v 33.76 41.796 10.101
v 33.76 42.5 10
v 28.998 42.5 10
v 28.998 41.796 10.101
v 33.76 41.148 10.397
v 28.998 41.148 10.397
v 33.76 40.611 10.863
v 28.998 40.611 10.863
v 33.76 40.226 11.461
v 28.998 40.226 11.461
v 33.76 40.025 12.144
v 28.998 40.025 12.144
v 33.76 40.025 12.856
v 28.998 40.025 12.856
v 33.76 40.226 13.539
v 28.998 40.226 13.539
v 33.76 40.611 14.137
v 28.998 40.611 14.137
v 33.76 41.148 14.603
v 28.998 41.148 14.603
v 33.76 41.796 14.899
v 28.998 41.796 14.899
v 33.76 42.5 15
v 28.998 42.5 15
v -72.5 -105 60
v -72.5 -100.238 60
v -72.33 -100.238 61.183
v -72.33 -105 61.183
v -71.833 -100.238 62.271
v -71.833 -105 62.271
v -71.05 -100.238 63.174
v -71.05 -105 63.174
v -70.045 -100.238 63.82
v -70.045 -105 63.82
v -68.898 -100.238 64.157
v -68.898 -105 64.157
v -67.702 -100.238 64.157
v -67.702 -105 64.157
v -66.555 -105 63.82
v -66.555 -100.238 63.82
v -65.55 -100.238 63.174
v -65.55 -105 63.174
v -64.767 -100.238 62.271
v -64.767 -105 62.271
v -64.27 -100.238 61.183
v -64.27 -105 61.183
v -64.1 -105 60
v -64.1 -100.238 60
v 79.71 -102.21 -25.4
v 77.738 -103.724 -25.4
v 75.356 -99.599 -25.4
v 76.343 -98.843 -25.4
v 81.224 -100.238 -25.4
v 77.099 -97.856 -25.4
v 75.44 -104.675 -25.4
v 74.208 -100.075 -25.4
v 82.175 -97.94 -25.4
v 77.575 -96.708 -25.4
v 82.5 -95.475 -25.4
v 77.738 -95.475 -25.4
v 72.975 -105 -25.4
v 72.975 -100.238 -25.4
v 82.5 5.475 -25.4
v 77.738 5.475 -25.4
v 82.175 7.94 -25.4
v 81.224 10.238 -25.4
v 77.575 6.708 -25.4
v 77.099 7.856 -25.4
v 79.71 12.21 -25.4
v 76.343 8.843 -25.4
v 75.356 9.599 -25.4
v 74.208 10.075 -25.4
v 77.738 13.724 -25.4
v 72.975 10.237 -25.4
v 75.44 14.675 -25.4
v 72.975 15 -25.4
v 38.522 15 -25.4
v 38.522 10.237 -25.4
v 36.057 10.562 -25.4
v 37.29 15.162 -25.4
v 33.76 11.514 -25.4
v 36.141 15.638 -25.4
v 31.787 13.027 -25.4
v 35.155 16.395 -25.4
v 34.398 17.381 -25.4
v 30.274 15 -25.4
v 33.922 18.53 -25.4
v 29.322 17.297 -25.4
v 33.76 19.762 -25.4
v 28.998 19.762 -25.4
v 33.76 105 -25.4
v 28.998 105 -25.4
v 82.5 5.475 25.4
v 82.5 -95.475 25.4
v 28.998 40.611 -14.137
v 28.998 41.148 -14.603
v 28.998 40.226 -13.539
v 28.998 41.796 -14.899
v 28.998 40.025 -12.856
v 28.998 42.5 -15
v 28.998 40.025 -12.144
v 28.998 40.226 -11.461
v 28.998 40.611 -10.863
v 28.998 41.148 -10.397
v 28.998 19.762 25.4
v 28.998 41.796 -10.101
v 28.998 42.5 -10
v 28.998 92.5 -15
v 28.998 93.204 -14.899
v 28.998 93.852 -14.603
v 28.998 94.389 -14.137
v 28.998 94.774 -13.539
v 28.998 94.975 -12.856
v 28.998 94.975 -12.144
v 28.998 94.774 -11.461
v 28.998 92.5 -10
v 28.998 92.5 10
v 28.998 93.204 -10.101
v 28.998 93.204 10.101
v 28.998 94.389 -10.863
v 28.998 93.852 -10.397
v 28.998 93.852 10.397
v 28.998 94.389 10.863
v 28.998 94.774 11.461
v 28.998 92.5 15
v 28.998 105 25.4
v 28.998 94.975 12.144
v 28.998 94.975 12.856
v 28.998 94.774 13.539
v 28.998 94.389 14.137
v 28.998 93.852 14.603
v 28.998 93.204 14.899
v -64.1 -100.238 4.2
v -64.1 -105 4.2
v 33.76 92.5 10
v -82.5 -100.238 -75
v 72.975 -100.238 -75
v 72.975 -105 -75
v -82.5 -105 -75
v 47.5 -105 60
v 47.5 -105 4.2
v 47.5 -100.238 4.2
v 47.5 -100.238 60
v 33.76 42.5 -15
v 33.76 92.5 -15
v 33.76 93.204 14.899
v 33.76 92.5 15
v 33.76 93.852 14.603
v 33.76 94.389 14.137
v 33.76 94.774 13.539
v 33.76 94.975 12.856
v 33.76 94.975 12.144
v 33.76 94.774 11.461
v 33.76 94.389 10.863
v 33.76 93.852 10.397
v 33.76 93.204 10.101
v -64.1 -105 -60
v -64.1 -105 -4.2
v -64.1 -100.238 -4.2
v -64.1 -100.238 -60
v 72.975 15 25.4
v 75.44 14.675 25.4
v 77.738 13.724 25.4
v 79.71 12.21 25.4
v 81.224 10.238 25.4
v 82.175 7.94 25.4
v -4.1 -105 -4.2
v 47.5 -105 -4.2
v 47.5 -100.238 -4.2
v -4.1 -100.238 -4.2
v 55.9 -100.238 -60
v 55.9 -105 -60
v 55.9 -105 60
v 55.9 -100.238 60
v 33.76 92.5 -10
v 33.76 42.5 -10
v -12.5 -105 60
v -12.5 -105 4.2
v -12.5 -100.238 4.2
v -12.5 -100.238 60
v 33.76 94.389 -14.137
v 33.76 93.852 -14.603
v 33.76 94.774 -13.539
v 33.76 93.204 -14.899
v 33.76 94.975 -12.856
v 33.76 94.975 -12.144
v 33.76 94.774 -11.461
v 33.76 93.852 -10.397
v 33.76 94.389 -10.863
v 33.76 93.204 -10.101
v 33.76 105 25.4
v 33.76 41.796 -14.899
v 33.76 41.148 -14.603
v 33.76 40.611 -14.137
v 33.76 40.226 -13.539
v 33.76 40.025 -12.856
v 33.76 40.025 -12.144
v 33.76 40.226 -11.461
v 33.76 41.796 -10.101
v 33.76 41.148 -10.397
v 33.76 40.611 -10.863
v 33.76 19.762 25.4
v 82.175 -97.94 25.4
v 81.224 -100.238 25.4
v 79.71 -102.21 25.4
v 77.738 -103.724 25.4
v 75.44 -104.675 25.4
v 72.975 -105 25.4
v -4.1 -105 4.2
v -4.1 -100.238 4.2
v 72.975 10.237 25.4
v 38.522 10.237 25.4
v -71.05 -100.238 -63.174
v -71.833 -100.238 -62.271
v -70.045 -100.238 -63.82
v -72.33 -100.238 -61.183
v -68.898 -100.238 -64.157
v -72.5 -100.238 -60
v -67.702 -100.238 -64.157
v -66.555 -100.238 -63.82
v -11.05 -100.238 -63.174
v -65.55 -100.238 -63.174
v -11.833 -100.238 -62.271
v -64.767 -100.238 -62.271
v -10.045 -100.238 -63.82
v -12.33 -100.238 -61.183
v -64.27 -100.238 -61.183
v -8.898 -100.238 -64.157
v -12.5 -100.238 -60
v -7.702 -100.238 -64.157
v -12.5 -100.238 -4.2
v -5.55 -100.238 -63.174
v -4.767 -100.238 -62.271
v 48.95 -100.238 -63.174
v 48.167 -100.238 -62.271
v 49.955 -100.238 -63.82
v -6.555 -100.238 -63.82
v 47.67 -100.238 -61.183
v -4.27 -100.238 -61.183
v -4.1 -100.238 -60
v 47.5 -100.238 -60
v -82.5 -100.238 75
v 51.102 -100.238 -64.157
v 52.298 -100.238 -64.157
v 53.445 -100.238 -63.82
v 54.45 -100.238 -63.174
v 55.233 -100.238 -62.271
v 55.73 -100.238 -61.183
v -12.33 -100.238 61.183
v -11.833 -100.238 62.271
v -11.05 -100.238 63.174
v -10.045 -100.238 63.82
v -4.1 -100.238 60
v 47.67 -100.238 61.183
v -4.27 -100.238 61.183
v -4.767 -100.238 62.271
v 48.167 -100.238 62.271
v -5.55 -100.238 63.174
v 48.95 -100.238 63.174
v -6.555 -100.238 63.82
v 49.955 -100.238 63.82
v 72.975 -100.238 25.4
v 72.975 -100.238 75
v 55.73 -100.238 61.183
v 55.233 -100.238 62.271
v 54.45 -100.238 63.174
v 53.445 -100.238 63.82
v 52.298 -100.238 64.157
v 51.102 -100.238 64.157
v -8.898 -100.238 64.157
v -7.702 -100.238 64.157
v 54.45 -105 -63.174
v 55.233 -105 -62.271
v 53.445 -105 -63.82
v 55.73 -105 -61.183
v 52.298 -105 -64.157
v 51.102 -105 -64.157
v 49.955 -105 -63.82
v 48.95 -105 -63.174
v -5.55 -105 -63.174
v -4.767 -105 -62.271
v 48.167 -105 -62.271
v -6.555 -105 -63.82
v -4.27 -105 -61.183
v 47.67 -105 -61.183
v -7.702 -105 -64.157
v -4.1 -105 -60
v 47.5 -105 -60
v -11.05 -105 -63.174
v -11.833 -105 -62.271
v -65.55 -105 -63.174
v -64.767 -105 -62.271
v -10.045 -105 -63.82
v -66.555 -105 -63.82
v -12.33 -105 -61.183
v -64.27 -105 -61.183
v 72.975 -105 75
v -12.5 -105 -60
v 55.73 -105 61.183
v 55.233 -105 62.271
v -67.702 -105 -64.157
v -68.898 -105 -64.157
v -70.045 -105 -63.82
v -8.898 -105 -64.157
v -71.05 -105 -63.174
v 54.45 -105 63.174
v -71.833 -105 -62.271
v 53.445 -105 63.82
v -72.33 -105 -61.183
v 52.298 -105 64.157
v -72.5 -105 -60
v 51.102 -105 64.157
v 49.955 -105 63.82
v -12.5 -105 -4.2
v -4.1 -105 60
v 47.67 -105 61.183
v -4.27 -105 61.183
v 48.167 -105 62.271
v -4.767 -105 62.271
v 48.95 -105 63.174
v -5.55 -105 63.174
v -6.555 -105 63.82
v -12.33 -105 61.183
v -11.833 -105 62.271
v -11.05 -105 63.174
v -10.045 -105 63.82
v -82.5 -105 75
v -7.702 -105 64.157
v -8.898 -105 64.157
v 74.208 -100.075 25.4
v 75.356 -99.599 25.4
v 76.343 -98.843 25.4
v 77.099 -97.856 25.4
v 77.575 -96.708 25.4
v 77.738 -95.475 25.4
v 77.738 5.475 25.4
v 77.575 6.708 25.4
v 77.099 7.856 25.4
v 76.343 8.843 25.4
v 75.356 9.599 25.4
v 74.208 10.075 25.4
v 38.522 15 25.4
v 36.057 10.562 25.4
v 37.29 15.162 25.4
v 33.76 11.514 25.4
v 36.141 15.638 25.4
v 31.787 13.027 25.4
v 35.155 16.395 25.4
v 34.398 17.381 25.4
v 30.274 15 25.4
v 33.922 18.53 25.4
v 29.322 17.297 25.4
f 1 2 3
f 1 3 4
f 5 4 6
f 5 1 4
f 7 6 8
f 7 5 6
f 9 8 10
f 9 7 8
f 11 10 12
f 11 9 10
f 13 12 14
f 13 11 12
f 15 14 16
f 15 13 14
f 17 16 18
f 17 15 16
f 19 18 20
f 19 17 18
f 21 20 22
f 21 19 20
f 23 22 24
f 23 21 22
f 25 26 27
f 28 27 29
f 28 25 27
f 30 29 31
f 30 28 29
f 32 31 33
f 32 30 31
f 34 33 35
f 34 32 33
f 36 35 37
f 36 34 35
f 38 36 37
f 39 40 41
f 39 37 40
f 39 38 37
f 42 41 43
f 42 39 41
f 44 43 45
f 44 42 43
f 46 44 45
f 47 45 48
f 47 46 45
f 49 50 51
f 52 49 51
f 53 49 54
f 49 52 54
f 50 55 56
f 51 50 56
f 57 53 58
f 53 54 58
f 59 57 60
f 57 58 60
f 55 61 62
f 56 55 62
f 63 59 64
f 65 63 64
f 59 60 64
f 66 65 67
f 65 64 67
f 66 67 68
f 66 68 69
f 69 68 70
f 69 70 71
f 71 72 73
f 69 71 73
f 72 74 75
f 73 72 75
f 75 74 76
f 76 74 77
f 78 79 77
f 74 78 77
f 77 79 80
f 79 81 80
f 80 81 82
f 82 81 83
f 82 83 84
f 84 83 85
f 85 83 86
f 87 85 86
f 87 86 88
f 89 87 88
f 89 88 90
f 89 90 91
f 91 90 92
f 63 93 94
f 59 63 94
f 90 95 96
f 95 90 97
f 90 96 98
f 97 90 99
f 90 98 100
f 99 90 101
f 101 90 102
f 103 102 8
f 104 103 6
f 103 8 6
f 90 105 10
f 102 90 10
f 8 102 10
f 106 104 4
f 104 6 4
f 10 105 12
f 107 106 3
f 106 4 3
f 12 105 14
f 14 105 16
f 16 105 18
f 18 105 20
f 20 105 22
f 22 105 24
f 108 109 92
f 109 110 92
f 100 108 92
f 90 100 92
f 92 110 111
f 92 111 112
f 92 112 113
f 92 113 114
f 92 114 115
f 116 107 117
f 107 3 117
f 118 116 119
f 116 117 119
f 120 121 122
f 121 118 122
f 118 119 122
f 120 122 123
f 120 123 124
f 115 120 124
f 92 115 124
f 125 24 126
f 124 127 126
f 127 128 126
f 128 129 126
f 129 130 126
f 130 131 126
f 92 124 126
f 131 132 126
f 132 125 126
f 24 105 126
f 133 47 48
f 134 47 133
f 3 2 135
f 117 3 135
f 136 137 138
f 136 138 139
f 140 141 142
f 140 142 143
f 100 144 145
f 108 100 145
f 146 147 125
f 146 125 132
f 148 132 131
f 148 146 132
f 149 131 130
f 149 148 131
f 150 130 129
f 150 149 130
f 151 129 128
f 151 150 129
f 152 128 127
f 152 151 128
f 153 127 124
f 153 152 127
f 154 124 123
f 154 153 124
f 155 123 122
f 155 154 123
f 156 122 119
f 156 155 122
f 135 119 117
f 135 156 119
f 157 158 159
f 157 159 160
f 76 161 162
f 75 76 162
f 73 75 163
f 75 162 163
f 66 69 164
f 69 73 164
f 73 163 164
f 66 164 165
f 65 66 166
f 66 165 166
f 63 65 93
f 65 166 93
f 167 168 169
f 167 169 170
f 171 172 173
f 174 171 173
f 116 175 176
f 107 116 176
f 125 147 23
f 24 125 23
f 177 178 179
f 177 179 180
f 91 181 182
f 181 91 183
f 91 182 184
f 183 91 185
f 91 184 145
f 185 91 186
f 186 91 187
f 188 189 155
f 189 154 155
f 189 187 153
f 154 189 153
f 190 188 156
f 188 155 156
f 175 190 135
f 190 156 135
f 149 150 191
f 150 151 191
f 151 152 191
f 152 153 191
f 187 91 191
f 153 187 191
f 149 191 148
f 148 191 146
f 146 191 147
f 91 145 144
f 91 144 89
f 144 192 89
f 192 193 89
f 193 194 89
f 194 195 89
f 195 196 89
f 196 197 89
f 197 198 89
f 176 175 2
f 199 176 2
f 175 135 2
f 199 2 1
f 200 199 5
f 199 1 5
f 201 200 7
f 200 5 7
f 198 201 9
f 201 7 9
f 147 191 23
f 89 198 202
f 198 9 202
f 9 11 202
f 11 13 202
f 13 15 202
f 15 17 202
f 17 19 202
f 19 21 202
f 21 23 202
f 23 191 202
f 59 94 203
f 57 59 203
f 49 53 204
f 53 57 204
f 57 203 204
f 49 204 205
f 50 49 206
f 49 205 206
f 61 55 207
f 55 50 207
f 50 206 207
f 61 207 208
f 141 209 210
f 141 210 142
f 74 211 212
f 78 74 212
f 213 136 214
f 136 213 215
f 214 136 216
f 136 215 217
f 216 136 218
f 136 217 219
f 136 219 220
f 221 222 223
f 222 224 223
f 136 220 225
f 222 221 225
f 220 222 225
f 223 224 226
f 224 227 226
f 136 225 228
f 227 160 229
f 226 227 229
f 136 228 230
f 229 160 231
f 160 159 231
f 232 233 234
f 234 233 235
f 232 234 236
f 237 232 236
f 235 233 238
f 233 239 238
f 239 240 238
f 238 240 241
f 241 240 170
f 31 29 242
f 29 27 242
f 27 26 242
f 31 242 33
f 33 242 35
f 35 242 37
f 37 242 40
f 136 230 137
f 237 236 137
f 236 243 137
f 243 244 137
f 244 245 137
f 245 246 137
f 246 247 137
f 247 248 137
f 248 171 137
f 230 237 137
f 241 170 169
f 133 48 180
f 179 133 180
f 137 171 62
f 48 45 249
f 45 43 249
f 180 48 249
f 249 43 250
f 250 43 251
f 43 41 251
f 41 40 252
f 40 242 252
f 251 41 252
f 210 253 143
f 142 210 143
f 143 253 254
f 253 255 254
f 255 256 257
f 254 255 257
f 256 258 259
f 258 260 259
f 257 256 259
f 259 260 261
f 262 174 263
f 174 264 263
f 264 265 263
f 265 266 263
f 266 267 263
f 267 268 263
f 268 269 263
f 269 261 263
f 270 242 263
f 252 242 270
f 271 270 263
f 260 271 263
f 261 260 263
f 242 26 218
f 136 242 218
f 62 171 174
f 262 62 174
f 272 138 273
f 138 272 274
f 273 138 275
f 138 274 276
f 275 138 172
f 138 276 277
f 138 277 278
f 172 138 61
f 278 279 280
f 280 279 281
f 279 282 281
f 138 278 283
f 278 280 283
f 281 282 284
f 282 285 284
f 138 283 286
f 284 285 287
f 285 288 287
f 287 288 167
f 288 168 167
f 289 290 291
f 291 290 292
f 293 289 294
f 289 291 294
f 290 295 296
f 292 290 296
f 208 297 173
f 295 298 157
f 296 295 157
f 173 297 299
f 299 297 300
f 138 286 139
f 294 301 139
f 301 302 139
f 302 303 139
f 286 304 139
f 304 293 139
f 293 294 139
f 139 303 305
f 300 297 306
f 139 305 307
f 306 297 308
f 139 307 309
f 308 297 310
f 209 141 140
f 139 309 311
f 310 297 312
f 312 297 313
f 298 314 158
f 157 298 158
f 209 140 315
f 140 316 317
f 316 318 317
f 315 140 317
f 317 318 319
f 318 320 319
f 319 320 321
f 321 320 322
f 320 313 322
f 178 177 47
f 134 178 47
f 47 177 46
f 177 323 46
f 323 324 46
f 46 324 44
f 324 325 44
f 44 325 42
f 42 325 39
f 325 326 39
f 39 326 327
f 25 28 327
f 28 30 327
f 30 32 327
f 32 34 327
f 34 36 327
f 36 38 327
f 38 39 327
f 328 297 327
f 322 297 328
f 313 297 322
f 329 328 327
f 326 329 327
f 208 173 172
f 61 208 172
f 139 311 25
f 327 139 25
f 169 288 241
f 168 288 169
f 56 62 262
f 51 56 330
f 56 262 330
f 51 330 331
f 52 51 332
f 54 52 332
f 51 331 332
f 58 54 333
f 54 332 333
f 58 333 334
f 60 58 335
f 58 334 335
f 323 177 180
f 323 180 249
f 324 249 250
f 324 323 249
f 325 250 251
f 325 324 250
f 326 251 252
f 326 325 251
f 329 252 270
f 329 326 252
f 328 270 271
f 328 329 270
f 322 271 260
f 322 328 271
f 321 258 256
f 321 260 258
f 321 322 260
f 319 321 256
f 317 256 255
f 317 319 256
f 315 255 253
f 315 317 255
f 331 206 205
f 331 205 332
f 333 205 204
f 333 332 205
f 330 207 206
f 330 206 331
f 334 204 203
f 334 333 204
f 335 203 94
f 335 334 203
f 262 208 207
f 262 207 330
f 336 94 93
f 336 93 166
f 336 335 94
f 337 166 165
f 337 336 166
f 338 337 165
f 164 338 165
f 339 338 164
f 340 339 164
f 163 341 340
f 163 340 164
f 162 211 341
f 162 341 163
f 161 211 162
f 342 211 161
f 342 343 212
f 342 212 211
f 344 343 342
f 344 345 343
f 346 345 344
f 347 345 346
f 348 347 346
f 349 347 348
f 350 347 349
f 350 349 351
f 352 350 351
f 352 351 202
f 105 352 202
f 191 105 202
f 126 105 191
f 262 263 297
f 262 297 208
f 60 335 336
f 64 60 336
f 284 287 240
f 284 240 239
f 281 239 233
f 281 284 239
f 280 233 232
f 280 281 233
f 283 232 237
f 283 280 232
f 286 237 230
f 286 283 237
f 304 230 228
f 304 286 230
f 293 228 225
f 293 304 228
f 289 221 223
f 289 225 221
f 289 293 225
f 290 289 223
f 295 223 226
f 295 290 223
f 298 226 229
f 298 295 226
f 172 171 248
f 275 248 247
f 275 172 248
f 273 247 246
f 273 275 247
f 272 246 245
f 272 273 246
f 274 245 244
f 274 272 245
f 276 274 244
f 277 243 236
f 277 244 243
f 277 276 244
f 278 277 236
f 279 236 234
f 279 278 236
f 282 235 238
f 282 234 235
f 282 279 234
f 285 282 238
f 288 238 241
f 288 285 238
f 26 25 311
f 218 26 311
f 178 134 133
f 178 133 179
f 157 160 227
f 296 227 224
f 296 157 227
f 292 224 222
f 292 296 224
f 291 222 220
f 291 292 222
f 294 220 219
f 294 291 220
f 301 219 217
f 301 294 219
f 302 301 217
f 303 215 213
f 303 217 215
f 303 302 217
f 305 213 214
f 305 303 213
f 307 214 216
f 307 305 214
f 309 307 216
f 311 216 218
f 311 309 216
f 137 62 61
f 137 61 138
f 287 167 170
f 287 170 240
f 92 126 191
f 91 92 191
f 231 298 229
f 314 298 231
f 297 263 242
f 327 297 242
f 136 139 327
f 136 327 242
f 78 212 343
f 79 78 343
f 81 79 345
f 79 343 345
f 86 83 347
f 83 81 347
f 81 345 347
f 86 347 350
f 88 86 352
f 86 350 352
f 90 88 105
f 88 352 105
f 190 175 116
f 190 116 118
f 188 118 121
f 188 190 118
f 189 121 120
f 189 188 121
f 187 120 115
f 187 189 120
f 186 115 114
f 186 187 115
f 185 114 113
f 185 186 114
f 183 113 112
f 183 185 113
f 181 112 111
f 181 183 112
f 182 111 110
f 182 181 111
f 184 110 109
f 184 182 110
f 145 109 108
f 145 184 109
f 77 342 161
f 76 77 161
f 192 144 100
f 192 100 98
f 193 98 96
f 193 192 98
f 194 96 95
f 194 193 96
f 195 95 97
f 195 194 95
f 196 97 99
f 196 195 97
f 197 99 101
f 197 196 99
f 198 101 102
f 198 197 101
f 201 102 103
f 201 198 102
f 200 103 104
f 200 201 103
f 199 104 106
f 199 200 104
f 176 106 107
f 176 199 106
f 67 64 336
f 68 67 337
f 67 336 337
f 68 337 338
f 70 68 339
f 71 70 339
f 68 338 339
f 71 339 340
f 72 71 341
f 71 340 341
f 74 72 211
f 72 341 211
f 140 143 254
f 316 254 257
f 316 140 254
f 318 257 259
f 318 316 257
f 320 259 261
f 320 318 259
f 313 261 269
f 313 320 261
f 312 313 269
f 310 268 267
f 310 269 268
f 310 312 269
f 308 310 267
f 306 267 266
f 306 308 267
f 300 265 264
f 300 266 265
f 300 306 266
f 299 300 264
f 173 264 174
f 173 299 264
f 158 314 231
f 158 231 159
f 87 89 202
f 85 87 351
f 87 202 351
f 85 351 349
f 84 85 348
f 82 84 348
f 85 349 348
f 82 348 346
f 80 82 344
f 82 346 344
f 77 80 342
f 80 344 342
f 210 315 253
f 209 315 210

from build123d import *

# Parameters (mm, degrees)
BRIDA_BASE1_DEPTH           = 75
CORTAR_EXTRUIR1_START       = -9.525
CORTAR_EXTRUIR1_OUTLINE_W   = 49.6
CORTAR_EXTRUIR1_OUTLINE_H   = 121
CORTAR_EXTRUIR1_DEPTH       = 9.525
CORTAR_EXTRUIR1_START_2     = -53.5025
CORTAR_EXTRUIR1_2_OUTLINE_W = 49.6
CORTAR_EXTRUIR1_2_OUTLINE_H = 94.7625
CORTAR_EXTRUIR1_2_DEPTH     = 43.9775
CORTAR_EXTRUIR2_DEPTH       = 10
CORTAR_EXTRUIR3_DEPTH       = 10


# Read off the part's stored shape, not the designer's step: Cortar-Extruir1
# Sheet-metal steps are written as plain solids
with BuildPart() as part:
    # Croquis1 → Brida base1 (new, symmetric)
    with BuildSketch(Plane.XY):
        with BuildLine():
            Line((33.76, 105), (33.76, 19.7625))
            ThreePointArc((33.76, 19.7625), (35.154903955, 16.394903955), (38.5225, 15))
            Line((38.5225, 15), (72.975, 15))
            ThreePointArc((72.975, 15), (79.710192091, 12.210192091), (82.5, 5.475))
            Line((82.5, 5.475), (82.5, -95.475))
            ThreePointArc((82.5, -95.475), (79.710192091, -102.210192091), (72.975, -105))
            Line((72.975, -105), (-82.5, -105))
            Line((-82.5, -105), (-82.5, -100.2375))
            Line((-82.5, -100.2375), (72.975, -100.2375))
            ThreePointArc((72.975, -100.2375), (76.342596045, -98.842596045), (77.7375, -95.475))
            Line((77.7375, -95.475), (77.7375, 5.475))
            ThreePointArc((77.7375, 5.475), (76.342596045, 8.842596045), (72.975, 10.2375))
            Line((72.975, 10.2375), (38.5225, 10.2375))
            ThreePointArc((38.5225, 10.2375), (31.787307909, 13.027307909), (28.9975, 19.7625))
            Line((28.9975, 19.7625), (28.9975, 105))
            Line((28.9975, 105), (33.76, 105))
        make_face()
    extrude(amount=BRIDA_BASE1_DEPTH, both=True)

    # Cortar-Extruir1 outline → Cortar-Extruir1 (cut)
    with BuildSketch(Plane(origin=(82.5, 0, 0), x_dir=(0, 0, -1), z_dir=(1, 0, 0)).offset(CORTAR_EXTRUIR1_START)):
        with Locations((50.2, -45.5)):
            Rectangle(CORTAR_EXTRUIR1_OUTLINE_W, CORTAR_EXTRUIR1_OUTLINE_H)
        with Locations((-50.2, -45.5)):
            Rectangle(CORTAR_EXTRUIR1_OUTLINE_W, CORTAR_EXTRUIR1_OUTLINE_H)
    extrude(amount=CORTAR_EXTRUIR1_DEPTH, mode=Mode.SUBTRACT)

    # Cortar-Extruir1 2 outline → Cortar-Extruir1 2 (cut)
    with BuildSketch(Plane(origin=(82.5, 0, 0), x_dir=(0, 0, -1), z_dir=(1, 0, 0)).offset(CORTAR_EXTRUIR1_START_2)):
        with Locations((50.2, 57.61875)):
            Rectangle(CORTAR_EXTRUIR1_2_OUTLINE_W, CORTAR_EXTRUIR1_2_OUTLINE_H)
        with Locations((-50.2, 57.61875)):
            Rectangle(CORTAR_EXTRUIR1_2_OUTLINE_W, CORTAR_EXTRUIR1_2_OUTLINE_H)
    extrude(amount=CORTAR_EXTRUIR1_2_DEPTH, mode=Mode.SUBTRACT)

    # Croquis7 → Cortar-Extruir2 (cut)
    with BuildSketch(Plane(origin=(33.76, 0, 0), x_dir=(0, 0, -1), z_dir=(1, 0, 0))):
        with BuildLine():
            Line((-15, 42.5), (-15, 67.5))
            ThreePointArc((-15, 67.5), (-12.5, 65), (-10, 67.5))
            Line((-10, 67.5), (-10, 42.5))
            ThreePointArc((-10, 42.5), (-12.5, 40), (-15, 42.5))
        make_face()
        with BuildLine():
            ThreePointArc((-15, 67.5), (-12.5, 65), (-10, 67.5))
            ThreePointArc((-10, 67.5), (-12.5, 70), (-15, 67.5))
        make_face()
        with BuildLine():
            ThreePointArc((-10, 67.5), (-12.5, 70), (-15, 67.5))
            Line((-15, 67.5), (-15, 92.5))
            ThreePointArc((-15, 92.5), (-12.5, 95), (-10, 92.5))
            Line((-10, 92.5), (-10, 67.5))
        make_face()
        with BuildLine():
            ThreePointArc((15, 67.5), (12.5, 70), (10, 67.5))
            Line((10, 67.5), (10, 92.5))
            ThreePointArc((10, 92.5), (12.5, 95), (15, 92.5))
            Line((15, 92.5), (15, 67.5))
        make_face()
        with BuildLine():
            ThreePointArc((10, 67.5), (12.5, 65), (15, 67.5))
            ThreePointArc((15, 67.5), (12.5, 70), (10, 67.5))
        make_face()
        with BuildLine():
            Line((10, 42.5), (10, 67.5))
            ThreePointArc((10, 67.5), (12.5, 65), (15, 67.5))
            Line((15, 67.5), (15, 42.5))
            ThreePointArc((15, 42.5), (12.5, 40), (10, 42.5))
        make_face()
    extrude(amount=-CORTAR_EXTRUIR2_DEPTH, mode=Mode.SUBTRACT)

    # Croquis8 → Cortar-Extruir3 (cut)
    with BuildSketch(Plane.XZ.offset(105)):
        with BuildLine():
            Line((-72.5, -60), (-72.5, 60))
            ThreePointArc((-72.5, 60), (-68.3, 64.2), (-64.1, 60))
            Line((-64.1, 60), (-64.1, -60))
            ThreePointArc((-64.1, -60), (-68.3, -64.2), (-72.5, -60))
        make_face()
        with BuildLine():
            Line((-12.5, -60), (-12.5, 60))
            ThreePointArc((-12.5, 60), (-8.3, 64.2), (-4.1, 60))
            Line((-4.1, 60), (-4.1, -60))
            ThreePointArc((-4.1, -60), (-8.3, -64.2), (-12.5, -60))
        make_face()
        with BuildLine():
            Line((47.5, -60), (47.5, 60))
            ThreePointArc((47.5, 60), (51.7, 64.2), (55.9, 60))
            Line((55.9, 60), (55.9, -60))
            ThreePointArc((55.9, -60), (51.7, -64.2), (47.5, -60))
        make_face()
        with BuildLine():
            Line((-68.3, 4.2), (51.7, 4.2))
            ThreePointArc((51.7, 4.2), (55.9, 0), (51.7, -4.2))
            Line((51.7, -4.2), (-68.3, -4.2))
            ThreePointArc((-68.3, -4.2), (-72.5, 0), (-68.3, 4.2))
        make_face()
    extrude(amount=-CORTAR_EXTRUIR3_DEPTH, mode=Mode.SUBTRACT)


solid = part.part
